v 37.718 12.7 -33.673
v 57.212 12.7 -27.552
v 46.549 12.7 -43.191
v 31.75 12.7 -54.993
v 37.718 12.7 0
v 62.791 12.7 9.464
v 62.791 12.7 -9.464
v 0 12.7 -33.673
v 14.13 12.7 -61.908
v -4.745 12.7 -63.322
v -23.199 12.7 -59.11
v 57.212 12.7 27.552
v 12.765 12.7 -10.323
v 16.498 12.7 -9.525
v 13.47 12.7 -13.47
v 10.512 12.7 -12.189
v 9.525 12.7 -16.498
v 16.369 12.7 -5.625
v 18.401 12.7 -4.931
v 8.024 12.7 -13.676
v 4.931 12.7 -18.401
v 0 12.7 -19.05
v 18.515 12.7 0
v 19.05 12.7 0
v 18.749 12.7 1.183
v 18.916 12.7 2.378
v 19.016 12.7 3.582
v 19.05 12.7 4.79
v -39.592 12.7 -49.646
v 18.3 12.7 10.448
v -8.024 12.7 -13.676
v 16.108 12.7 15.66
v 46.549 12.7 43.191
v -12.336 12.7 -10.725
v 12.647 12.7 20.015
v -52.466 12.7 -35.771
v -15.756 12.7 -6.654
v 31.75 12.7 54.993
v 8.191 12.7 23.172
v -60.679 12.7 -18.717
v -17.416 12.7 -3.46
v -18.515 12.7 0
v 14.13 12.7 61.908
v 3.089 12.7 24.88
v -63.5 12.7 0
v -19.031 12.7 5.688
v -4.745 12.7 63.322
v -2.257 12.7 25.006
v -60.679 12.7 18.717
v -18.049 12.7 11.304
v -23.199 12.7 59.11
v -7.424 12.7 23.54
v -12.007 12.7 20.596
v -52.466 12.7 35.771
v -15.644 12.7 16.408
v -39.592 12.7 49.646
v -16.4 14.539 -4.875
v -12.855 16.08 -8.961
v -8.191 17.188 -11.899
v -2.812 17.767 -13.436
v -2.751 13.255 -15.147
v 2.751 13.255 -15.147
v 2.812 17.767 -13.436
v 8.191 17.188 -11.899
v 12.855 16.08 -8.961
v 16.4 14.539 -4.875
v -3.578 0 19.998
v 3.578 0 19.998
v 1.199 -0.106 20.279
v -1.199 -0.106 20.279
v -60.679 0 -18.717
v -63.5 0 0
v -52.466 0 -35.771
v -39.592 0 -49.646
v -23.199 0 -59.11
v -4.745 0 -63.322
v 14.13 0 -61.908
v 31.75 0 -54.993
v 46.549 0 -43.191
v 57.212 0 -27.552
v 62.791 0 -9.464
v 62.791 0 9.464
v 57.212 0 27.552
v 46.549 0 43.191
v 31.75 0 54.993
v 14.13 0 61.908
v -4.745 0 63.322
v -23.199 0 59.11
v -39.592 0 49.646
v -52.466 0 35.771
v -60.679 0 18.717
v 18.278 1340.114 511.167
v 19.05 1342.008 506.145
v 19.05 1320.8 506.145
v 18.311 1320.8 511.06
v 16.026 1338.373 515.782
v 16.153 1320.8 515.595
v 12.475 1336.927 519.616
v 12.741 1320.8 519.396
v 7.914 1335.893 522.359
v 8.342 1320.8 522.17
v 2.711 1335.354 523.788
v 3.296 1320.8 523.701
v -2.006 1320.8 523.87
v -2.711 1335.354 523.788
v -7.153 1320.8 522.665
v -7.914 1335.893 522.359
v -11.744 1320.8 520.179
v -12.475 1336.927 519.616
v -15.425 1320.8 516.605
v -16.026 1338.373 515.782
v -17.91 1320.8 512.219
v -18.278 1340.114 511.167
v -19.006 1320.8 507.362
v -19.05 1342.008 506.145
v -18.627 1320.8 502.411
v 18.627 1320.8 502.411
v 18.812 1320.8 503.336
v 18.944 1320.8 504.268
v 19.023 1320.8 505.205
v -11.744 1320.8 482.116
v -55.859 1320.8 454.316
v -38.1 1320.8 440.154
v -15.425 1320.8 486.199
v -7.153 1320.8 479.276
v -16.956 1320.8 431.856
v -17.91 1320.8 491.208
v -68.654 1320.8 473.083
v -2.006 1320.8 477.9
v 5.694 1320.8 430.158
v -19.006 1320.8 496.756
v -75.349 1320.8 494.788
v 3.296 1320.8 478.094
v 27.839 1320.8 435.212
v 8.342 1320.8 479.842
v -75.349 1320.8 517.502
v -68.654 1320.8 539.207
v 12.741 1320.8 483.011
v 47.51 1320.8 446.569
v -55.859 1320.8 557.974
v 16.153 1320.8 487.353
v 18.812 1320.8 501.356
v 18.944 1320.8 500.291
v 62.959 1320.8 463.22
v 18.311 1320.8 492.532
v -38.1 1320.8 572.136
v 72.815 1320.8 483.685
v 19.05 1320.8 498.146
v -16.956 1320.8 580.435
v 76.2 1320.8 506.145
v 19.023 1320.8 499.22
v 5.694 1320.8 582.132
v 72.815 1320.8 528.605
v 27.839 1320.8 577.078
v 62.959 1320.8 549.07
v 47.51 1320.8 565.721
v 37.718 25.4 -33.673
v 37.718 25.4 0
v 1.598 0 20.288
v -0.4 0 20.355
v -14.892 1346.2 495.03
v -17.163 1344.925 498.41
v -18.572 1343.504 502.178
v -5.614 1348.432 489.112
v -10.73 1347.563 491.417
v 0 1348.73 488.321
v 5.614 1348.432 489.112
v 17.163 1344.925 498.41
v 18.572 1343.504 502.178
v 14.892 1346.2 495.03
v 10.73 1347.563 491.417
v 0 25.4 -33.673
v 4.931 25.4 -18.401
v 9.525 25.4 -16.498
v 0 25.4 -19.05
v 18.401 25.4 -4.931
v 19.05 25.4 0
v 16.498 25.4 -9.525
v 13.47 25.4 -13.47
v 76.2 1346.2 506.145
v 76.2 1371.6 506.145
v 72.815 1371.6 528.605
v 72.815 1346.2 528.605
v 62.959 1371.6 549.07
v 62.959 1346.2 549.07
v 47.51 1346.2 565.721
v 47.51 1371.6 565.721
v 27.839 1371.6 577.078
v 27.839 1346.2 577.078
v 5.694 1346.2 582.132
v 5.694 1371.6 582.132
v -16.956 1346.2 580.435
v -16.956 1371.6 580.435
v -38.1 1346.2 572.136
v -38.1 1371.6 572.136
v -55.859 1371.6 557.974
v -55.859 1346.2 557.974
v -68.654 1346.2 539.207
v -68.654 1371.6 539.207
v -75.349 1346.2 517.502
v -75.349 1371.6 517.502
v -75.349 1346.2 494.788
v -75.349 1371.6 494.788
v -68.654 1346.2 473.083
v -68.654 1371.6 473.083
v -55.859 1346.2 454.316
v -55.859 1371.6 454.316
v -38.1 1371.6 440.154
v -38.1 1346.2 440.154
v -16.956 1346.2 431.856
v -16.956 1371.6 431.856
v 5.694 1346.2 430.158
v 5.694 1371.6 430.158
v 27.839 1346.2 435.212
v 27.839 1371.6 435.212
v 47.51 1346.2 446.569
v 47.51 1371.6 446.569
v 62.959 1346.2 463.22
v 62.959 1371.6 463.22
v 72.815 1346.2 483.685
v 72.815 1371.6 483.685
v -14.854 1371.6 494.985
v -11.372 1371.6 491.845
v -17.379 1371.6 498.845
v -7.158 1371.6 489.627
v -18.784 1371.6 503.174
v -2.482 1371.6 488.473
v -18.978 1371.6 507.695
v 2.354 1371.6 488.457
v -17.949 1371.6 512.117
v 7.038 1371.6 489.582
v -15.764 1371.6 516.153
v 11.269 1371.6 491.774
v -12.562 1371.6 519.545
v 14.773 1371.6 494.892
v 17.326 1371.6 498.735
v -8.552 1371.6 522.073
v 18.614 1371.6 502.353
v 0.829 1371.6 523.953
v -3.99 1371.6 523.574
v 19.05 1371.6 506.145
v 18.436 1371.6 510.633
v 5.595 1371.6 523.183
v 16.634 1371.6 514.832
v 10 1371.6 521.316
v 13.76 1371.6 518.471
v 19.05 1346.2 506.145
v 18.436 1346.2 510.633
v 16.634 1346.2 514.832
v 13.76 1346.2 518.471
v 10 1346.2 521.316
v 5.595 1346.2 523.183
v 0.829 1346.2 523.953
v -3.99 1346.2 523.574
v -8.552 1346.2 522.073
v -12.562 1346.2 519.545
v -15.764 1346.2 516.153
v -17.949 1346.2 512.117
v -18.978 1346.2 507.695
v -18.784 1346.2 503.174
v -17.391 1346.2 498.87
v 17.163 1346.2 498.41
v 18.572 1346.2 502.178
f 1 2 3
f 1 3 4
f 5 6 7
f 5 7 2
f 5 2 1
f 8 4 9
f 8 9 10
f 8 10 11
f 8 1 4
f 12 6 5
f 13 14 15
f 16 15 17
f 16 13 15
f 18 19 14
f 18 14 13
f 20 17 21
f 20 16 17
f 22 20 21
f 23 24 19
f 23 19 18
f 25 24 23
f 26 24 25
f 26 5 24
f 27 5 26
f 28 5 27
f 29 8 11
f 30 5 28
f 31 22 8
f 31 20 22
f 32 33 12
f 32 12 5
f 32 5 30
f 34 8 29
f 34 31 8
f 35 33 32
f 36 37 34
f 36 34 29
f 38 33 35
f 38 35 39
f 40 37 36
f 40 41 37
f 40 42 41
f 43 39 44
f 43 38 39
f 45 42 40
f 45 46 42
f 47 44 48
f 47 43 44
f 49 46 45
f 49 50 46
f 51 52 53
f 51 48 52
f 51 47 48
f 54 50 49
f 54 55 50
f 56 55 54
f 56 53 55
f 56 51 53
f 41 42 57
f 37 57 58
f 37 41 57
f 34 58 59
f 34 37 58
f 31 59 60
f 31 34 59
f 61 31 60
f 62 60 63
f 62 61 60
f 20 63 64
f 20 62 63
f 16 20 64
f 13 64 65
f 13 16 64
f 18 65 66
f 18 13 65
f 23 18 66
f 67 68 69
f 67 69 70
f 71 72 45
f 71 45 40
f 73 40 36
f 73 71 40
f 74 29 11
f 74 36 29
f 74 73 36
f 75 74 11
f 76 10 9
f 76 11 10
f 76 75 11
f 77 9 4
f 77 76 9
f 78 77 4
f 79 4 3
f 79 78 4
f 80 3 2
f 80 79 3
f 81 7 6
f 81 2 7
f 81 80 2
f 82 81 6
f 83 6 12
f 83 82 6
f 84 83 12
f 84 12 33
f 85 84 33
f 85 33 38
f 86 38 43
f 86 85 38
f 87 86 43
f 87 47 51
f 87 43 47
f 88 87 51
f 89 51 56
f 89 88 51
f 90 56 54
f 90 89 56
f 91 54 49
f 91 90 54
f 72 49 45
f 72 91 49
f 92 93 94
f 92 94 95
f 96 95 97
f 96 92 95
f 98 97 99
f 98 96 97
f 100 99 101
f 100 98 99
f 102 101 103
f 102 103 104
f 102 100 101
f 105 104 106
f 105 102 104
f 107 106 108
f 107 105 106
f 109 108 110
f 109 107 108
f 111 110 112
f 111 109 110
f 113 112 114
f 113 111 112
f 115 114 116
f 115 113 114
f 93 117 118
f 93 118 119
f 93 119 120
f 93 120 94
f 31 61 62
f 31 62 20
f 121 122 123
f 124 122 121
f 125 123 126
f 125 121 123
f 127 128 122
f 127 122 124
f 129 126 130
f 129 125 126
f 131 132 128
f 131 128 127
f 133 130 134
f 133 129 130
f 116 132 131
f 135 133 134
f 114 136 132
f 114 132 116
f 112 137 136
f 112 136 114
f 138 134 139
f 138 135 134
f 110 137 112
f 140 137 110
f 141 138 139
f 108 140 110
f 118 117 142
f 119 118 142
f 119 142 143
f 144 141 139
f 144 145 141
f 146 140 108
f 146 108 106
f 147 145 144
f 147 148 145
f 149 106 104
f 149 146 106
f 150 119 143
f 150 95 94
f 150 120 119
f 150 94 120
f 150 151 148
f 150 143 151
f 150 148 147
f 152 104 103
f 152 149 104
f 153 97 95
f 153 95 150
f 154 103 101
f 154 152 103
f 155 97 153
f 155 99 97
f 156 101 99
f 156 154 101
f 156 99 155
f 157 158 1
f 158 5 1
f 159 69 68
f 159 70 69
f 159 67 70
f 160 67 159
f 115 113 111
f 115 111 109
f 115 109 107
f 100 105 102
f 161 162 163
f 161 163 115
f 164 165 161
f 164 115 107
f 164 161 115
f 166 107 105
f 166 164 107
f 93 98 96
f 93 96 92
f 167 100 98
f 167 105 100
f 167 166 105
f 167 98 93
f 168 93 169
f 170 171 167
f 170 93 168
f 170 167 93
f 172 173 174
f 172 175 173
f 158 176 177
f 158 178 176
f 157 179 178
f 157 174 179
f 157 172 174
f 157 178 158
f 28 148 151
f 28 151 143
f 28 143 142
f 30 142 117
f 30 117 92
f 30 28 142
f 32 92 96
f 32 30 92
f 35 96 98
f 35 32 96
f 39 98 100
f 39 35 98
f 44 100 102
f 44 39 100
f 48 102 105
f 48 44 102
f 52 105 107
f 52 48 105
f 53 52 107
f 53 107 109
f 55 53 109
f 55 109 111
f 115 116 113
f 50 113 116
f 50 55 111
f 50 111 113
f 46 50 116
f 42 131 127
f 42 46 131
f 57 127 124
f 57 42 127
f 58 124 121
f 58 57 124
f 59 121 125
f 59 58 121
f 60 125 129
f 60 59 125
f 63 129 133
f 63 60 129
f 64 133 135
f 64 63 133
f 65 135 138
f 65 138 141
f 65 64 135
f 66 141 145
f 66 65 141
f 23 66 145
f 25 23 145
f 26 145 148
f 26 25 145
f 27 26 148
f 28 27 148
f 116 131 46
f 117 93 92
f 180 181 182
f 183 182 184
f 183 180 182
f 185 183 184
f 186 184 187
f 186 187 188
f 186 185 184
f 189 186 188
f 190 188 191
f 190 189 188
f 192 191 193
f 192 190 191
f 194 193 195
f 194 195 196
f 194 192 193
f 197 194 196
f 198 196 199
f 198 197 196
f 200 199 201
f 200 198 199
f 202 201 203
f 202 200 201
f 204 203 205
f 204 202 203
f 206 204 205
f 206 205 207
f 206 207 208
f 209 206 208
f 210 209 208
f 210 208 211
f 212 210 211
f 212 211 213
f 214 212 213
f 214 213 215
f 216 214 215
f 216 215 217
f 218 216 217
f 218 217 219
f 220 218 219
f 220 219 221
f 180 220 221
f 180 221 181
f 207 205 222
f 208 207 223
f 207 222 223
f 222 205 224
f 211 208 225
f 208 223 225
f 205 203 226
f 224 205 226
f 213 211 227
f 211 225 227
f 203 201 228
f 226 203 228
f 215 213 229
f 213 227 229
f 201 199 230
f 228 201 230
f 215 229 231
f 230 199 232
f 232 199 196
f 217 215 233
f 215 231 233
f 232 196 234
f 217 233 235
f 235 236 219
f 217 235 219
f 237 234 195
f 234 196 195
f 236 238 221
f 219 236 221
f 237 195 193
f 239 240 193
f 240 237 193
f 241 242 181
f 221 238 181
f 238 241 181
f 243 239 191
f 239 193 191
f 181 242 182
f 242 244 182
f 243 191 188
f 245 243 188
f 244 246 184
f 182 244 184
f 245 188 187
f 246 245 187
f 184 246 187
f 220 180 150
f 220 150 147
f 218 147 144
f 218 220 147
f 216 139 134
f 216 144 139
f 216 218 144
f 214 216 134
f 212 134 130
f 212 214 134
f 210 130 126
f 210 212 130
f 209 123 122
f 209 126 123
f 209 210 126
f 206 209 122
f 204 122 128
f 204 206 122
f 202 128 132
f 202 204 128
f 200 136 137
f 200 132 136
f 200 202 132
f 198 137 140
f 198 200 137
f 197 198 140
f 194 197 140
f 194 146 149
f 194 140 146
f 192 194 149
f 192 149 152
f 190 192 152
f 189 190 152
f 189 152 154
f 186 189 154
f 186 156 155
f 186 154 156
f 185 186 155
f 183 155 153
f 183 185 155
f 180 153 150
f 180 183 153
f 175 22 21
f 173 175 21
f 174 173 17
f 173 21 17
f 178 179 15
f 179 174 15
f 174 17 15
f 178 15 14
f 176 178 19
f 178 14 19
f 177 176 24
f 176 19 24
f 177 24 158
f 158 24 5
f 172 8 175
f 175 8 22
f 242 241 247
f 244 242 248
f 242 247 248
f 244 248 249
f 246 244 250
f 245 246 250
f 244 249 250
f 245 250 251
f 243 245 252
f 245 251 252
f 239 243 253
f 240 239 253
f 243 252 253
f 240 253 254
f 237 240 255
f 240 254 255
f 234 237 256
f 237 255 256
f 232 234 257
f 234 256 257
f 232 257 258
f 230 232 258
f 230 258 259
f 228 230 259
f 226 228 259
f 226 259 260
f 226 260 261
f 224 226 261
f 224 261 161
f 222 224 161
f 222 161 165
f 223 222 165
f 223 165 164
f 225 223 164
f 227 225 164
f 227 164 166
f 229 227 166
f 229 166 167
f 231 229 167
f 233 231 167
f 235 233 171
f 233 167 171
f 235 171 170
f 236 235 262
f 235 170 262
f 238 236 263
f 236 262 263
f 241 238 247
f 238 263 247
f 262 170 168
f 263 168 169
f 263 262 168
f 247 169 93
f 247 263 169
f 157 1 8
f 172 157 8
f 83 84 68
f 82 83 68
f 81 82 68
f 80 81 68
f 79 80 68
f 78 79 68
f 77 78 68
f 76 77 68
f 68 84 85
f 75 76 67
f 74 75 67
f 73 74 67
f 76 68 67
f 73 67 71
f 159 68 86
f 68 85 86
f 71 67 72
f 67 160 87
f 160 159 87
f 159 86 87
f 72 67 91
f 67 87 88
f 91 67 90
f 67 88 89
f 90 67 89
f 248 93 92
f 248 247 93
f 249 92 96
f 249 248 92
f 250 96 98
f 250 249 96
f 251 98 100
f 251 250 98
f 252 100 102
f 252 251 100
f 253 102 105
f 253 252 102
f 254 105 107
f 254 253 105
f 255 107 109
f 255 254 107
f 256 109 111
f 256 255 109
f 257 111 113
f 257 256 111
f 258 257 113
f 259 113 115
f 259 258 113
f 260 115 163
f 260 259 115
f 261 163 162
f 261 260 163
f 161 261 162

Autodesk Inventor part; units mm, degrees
ref_plane "YZ Plane" through (0, 0, 0) normal (1, 0, 0) x (0, 1, 0)
ref_plane "XZ Plane" through (0, 0, 0) normal (0, 1, 0) x (-1, 0, 0)
ref_plane "XY Plane" through (0, 0, 0) normal (0, 0, 1) x (1, 0, 0)
sketch "Sketch1" plane through (0, 0, 0) normal (0, 1, 0) x (-1, 0, 0)
  circle A0 centre (0, 0) radius 63.5
  dimension "d0" = 127
extrude "Extrusion1" add sketch "Sketch1" along normal blind 12.7
sketch "Sketch2" plane through (0, 12.7, 0) normal (0, 1, 0) x (1, 0, 0)
  circle A0 centre (0, 0) radius 19.05
  circle A1 centre (0, 0) radius 63.5
  line L0 (0, 0) -> (37.718266, 0)
  line L1 (37.718266, 0) -> (37.718266, 33.673151)
  line L2 (37.718266, 33.673151) -> (0, 33.673151)
  line L3 (0, 33.673151) -> (0, 0)
  point P0 (63.5, 0)
  point P1 (0, 19.05)
  point P2 (19.05, 0)
  dimension "d3" = 38.1
extrude "Extrusion2" add sketch "Sketch2" along normal blind 12.7 contours A0 L3 L2 L1 L0
ref_plane "Work Plane1" through (9.525, 12.7, 0) normal (0, -0.9356646, -0.3528907) x (-1, 0, 0)
sketch "Sketch3" plane through (9.525, 12.7, 0) normal (0, -0.9356646, -0.3528907) x (-1, 0, 0)
  circle A0 centre (9.525, -4.481711) radius 19.05
  dimension "d6" = 38.1
extrude "Extrusion3" add sketch "Sketch3" along normal blind 4.826
sketch "Sketch4" plane through (9.525, 12.7, 0) normal (0, 0.9356646, 0.3528907) x (1, 0, 0)
  circle A0 centre (-9.525, -4.481711) radius 19.05
extrude "Extrusion4" add sketch "Sketch4" along normal blind 1422.4
ref_plane "Work Plane2" through (0, 1346.2, 0) normal (0, -1, 0) x (1, 0, 0)
sketch "Sketch5" plane through (0, 1346.2, 0) normal (0, -1, 0) x (1, 0, 0)
  ellipse E0 centre (0, 506.145041) end of major axis (19.05, 506.145041) minor radius 17.82441
  circle A0 centre (0, 506.145041) radius 76.2
  point P0 (0, 0)
  dimension "d12" = 152.4
extrude "Extrusion5" add sketch "Sketch5" along normal blind 25.4 and the other way blind 25.4
properties part number "Legs" material "Aluminum 6061"
